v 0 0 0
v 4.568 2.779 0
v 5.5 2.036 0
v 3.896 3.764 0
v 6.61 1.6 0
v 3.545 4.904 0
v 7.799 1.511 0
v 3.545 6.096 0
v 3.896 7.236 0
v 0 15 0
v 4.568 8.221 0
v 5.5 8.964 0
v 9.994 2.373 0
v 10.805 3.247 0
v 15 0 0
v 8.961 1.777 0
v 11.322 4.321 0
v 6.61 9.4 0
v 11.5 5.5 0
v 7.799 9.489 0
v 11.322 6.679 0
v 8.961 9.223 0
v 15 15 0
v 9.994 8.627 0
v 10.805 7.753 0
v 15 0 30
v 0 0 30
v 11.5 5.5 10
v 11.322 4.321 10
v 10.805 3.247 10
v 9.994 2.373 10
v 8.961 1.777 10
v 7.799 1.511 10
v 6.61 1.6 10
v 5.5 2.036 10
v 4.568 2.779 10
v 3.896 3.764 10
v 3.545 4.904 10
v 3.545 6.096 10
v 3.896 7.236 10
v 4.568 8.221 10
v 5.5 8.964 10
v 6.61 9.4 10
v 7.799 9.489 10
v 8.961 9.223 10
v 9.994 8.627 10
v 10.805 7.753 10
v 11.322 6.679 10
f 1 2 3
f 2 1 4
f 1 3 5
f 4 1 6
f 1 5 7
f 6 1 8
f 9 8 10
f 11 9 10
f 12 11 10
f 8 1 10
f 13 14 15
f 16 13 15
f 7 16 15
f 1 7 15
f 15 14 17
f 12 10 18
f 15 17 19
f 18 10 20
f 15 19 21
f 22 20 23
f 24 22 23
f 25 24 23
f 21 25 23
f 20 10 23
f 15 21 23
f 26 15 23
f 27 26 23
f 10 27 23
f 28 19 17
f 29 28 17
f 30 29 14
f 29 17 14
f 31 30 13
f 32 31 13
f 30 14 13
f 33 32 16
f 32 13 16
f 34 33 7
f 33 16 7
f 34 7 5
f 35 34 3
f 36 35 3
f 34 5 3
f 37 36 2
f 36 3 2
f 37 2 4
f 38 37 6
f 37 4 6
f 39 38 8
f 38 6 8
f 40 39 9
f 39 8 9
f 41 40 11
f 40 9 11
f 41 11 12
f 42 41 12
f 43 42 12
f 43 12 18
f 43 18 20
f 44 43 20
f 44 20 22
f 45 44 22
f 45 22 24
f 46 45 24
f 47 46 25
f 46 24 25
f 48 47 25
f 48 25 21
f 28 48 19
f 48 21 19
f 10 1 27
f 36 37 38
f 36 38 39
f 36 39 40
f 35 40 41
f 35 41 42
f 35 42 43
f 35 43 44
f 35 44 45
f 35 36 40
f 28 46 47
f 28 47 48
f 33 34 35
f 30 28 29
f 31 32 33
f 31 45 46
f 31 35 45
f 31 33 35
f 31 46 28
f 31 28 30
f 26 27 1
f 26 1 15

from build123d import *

# Parameters (mm, degrees)
F0_W     = 15
F0_H     = 15
F1_DEPTH = 30
F3_DEPTH = 25
F4_R     = 4
F5_DEPTH = 10


# Not quite as in the source:
# - a feature names something its author has since deleted; it is built from what else it names


with BuildPart() as f1:
    # F0 (on Top) → F1 (new body)
    with BuildSketch(Plane.XY):
        with Locations((7.5, 7.5)):
            Rectangle(F0_W, F0_H)
    extrude(amount=F1_DEPTH)

    # F2 (on face) → F3 (cut)
    with BuildSketch(Plane.YZ.offset(15)):
        Polygon((15, 30), (0, 30), (15, 0), align=None)
    extrude(amount=-F3_DEPTH, mode=Mode.SUBTRACT)

    # F4 (on face) → F5 (cut)
    with BuildSketch(Plane(origin=(0, 0, 0), x_dir=(1, 0, 0), z_dir=(0, 0, -1))):
        with Locations((7.5, -5.5)):
            Circle(F4_R)
    extrude(amount=-F5_DEPTH, mode=Mode.SUBTRACT)


solid = f1.part
